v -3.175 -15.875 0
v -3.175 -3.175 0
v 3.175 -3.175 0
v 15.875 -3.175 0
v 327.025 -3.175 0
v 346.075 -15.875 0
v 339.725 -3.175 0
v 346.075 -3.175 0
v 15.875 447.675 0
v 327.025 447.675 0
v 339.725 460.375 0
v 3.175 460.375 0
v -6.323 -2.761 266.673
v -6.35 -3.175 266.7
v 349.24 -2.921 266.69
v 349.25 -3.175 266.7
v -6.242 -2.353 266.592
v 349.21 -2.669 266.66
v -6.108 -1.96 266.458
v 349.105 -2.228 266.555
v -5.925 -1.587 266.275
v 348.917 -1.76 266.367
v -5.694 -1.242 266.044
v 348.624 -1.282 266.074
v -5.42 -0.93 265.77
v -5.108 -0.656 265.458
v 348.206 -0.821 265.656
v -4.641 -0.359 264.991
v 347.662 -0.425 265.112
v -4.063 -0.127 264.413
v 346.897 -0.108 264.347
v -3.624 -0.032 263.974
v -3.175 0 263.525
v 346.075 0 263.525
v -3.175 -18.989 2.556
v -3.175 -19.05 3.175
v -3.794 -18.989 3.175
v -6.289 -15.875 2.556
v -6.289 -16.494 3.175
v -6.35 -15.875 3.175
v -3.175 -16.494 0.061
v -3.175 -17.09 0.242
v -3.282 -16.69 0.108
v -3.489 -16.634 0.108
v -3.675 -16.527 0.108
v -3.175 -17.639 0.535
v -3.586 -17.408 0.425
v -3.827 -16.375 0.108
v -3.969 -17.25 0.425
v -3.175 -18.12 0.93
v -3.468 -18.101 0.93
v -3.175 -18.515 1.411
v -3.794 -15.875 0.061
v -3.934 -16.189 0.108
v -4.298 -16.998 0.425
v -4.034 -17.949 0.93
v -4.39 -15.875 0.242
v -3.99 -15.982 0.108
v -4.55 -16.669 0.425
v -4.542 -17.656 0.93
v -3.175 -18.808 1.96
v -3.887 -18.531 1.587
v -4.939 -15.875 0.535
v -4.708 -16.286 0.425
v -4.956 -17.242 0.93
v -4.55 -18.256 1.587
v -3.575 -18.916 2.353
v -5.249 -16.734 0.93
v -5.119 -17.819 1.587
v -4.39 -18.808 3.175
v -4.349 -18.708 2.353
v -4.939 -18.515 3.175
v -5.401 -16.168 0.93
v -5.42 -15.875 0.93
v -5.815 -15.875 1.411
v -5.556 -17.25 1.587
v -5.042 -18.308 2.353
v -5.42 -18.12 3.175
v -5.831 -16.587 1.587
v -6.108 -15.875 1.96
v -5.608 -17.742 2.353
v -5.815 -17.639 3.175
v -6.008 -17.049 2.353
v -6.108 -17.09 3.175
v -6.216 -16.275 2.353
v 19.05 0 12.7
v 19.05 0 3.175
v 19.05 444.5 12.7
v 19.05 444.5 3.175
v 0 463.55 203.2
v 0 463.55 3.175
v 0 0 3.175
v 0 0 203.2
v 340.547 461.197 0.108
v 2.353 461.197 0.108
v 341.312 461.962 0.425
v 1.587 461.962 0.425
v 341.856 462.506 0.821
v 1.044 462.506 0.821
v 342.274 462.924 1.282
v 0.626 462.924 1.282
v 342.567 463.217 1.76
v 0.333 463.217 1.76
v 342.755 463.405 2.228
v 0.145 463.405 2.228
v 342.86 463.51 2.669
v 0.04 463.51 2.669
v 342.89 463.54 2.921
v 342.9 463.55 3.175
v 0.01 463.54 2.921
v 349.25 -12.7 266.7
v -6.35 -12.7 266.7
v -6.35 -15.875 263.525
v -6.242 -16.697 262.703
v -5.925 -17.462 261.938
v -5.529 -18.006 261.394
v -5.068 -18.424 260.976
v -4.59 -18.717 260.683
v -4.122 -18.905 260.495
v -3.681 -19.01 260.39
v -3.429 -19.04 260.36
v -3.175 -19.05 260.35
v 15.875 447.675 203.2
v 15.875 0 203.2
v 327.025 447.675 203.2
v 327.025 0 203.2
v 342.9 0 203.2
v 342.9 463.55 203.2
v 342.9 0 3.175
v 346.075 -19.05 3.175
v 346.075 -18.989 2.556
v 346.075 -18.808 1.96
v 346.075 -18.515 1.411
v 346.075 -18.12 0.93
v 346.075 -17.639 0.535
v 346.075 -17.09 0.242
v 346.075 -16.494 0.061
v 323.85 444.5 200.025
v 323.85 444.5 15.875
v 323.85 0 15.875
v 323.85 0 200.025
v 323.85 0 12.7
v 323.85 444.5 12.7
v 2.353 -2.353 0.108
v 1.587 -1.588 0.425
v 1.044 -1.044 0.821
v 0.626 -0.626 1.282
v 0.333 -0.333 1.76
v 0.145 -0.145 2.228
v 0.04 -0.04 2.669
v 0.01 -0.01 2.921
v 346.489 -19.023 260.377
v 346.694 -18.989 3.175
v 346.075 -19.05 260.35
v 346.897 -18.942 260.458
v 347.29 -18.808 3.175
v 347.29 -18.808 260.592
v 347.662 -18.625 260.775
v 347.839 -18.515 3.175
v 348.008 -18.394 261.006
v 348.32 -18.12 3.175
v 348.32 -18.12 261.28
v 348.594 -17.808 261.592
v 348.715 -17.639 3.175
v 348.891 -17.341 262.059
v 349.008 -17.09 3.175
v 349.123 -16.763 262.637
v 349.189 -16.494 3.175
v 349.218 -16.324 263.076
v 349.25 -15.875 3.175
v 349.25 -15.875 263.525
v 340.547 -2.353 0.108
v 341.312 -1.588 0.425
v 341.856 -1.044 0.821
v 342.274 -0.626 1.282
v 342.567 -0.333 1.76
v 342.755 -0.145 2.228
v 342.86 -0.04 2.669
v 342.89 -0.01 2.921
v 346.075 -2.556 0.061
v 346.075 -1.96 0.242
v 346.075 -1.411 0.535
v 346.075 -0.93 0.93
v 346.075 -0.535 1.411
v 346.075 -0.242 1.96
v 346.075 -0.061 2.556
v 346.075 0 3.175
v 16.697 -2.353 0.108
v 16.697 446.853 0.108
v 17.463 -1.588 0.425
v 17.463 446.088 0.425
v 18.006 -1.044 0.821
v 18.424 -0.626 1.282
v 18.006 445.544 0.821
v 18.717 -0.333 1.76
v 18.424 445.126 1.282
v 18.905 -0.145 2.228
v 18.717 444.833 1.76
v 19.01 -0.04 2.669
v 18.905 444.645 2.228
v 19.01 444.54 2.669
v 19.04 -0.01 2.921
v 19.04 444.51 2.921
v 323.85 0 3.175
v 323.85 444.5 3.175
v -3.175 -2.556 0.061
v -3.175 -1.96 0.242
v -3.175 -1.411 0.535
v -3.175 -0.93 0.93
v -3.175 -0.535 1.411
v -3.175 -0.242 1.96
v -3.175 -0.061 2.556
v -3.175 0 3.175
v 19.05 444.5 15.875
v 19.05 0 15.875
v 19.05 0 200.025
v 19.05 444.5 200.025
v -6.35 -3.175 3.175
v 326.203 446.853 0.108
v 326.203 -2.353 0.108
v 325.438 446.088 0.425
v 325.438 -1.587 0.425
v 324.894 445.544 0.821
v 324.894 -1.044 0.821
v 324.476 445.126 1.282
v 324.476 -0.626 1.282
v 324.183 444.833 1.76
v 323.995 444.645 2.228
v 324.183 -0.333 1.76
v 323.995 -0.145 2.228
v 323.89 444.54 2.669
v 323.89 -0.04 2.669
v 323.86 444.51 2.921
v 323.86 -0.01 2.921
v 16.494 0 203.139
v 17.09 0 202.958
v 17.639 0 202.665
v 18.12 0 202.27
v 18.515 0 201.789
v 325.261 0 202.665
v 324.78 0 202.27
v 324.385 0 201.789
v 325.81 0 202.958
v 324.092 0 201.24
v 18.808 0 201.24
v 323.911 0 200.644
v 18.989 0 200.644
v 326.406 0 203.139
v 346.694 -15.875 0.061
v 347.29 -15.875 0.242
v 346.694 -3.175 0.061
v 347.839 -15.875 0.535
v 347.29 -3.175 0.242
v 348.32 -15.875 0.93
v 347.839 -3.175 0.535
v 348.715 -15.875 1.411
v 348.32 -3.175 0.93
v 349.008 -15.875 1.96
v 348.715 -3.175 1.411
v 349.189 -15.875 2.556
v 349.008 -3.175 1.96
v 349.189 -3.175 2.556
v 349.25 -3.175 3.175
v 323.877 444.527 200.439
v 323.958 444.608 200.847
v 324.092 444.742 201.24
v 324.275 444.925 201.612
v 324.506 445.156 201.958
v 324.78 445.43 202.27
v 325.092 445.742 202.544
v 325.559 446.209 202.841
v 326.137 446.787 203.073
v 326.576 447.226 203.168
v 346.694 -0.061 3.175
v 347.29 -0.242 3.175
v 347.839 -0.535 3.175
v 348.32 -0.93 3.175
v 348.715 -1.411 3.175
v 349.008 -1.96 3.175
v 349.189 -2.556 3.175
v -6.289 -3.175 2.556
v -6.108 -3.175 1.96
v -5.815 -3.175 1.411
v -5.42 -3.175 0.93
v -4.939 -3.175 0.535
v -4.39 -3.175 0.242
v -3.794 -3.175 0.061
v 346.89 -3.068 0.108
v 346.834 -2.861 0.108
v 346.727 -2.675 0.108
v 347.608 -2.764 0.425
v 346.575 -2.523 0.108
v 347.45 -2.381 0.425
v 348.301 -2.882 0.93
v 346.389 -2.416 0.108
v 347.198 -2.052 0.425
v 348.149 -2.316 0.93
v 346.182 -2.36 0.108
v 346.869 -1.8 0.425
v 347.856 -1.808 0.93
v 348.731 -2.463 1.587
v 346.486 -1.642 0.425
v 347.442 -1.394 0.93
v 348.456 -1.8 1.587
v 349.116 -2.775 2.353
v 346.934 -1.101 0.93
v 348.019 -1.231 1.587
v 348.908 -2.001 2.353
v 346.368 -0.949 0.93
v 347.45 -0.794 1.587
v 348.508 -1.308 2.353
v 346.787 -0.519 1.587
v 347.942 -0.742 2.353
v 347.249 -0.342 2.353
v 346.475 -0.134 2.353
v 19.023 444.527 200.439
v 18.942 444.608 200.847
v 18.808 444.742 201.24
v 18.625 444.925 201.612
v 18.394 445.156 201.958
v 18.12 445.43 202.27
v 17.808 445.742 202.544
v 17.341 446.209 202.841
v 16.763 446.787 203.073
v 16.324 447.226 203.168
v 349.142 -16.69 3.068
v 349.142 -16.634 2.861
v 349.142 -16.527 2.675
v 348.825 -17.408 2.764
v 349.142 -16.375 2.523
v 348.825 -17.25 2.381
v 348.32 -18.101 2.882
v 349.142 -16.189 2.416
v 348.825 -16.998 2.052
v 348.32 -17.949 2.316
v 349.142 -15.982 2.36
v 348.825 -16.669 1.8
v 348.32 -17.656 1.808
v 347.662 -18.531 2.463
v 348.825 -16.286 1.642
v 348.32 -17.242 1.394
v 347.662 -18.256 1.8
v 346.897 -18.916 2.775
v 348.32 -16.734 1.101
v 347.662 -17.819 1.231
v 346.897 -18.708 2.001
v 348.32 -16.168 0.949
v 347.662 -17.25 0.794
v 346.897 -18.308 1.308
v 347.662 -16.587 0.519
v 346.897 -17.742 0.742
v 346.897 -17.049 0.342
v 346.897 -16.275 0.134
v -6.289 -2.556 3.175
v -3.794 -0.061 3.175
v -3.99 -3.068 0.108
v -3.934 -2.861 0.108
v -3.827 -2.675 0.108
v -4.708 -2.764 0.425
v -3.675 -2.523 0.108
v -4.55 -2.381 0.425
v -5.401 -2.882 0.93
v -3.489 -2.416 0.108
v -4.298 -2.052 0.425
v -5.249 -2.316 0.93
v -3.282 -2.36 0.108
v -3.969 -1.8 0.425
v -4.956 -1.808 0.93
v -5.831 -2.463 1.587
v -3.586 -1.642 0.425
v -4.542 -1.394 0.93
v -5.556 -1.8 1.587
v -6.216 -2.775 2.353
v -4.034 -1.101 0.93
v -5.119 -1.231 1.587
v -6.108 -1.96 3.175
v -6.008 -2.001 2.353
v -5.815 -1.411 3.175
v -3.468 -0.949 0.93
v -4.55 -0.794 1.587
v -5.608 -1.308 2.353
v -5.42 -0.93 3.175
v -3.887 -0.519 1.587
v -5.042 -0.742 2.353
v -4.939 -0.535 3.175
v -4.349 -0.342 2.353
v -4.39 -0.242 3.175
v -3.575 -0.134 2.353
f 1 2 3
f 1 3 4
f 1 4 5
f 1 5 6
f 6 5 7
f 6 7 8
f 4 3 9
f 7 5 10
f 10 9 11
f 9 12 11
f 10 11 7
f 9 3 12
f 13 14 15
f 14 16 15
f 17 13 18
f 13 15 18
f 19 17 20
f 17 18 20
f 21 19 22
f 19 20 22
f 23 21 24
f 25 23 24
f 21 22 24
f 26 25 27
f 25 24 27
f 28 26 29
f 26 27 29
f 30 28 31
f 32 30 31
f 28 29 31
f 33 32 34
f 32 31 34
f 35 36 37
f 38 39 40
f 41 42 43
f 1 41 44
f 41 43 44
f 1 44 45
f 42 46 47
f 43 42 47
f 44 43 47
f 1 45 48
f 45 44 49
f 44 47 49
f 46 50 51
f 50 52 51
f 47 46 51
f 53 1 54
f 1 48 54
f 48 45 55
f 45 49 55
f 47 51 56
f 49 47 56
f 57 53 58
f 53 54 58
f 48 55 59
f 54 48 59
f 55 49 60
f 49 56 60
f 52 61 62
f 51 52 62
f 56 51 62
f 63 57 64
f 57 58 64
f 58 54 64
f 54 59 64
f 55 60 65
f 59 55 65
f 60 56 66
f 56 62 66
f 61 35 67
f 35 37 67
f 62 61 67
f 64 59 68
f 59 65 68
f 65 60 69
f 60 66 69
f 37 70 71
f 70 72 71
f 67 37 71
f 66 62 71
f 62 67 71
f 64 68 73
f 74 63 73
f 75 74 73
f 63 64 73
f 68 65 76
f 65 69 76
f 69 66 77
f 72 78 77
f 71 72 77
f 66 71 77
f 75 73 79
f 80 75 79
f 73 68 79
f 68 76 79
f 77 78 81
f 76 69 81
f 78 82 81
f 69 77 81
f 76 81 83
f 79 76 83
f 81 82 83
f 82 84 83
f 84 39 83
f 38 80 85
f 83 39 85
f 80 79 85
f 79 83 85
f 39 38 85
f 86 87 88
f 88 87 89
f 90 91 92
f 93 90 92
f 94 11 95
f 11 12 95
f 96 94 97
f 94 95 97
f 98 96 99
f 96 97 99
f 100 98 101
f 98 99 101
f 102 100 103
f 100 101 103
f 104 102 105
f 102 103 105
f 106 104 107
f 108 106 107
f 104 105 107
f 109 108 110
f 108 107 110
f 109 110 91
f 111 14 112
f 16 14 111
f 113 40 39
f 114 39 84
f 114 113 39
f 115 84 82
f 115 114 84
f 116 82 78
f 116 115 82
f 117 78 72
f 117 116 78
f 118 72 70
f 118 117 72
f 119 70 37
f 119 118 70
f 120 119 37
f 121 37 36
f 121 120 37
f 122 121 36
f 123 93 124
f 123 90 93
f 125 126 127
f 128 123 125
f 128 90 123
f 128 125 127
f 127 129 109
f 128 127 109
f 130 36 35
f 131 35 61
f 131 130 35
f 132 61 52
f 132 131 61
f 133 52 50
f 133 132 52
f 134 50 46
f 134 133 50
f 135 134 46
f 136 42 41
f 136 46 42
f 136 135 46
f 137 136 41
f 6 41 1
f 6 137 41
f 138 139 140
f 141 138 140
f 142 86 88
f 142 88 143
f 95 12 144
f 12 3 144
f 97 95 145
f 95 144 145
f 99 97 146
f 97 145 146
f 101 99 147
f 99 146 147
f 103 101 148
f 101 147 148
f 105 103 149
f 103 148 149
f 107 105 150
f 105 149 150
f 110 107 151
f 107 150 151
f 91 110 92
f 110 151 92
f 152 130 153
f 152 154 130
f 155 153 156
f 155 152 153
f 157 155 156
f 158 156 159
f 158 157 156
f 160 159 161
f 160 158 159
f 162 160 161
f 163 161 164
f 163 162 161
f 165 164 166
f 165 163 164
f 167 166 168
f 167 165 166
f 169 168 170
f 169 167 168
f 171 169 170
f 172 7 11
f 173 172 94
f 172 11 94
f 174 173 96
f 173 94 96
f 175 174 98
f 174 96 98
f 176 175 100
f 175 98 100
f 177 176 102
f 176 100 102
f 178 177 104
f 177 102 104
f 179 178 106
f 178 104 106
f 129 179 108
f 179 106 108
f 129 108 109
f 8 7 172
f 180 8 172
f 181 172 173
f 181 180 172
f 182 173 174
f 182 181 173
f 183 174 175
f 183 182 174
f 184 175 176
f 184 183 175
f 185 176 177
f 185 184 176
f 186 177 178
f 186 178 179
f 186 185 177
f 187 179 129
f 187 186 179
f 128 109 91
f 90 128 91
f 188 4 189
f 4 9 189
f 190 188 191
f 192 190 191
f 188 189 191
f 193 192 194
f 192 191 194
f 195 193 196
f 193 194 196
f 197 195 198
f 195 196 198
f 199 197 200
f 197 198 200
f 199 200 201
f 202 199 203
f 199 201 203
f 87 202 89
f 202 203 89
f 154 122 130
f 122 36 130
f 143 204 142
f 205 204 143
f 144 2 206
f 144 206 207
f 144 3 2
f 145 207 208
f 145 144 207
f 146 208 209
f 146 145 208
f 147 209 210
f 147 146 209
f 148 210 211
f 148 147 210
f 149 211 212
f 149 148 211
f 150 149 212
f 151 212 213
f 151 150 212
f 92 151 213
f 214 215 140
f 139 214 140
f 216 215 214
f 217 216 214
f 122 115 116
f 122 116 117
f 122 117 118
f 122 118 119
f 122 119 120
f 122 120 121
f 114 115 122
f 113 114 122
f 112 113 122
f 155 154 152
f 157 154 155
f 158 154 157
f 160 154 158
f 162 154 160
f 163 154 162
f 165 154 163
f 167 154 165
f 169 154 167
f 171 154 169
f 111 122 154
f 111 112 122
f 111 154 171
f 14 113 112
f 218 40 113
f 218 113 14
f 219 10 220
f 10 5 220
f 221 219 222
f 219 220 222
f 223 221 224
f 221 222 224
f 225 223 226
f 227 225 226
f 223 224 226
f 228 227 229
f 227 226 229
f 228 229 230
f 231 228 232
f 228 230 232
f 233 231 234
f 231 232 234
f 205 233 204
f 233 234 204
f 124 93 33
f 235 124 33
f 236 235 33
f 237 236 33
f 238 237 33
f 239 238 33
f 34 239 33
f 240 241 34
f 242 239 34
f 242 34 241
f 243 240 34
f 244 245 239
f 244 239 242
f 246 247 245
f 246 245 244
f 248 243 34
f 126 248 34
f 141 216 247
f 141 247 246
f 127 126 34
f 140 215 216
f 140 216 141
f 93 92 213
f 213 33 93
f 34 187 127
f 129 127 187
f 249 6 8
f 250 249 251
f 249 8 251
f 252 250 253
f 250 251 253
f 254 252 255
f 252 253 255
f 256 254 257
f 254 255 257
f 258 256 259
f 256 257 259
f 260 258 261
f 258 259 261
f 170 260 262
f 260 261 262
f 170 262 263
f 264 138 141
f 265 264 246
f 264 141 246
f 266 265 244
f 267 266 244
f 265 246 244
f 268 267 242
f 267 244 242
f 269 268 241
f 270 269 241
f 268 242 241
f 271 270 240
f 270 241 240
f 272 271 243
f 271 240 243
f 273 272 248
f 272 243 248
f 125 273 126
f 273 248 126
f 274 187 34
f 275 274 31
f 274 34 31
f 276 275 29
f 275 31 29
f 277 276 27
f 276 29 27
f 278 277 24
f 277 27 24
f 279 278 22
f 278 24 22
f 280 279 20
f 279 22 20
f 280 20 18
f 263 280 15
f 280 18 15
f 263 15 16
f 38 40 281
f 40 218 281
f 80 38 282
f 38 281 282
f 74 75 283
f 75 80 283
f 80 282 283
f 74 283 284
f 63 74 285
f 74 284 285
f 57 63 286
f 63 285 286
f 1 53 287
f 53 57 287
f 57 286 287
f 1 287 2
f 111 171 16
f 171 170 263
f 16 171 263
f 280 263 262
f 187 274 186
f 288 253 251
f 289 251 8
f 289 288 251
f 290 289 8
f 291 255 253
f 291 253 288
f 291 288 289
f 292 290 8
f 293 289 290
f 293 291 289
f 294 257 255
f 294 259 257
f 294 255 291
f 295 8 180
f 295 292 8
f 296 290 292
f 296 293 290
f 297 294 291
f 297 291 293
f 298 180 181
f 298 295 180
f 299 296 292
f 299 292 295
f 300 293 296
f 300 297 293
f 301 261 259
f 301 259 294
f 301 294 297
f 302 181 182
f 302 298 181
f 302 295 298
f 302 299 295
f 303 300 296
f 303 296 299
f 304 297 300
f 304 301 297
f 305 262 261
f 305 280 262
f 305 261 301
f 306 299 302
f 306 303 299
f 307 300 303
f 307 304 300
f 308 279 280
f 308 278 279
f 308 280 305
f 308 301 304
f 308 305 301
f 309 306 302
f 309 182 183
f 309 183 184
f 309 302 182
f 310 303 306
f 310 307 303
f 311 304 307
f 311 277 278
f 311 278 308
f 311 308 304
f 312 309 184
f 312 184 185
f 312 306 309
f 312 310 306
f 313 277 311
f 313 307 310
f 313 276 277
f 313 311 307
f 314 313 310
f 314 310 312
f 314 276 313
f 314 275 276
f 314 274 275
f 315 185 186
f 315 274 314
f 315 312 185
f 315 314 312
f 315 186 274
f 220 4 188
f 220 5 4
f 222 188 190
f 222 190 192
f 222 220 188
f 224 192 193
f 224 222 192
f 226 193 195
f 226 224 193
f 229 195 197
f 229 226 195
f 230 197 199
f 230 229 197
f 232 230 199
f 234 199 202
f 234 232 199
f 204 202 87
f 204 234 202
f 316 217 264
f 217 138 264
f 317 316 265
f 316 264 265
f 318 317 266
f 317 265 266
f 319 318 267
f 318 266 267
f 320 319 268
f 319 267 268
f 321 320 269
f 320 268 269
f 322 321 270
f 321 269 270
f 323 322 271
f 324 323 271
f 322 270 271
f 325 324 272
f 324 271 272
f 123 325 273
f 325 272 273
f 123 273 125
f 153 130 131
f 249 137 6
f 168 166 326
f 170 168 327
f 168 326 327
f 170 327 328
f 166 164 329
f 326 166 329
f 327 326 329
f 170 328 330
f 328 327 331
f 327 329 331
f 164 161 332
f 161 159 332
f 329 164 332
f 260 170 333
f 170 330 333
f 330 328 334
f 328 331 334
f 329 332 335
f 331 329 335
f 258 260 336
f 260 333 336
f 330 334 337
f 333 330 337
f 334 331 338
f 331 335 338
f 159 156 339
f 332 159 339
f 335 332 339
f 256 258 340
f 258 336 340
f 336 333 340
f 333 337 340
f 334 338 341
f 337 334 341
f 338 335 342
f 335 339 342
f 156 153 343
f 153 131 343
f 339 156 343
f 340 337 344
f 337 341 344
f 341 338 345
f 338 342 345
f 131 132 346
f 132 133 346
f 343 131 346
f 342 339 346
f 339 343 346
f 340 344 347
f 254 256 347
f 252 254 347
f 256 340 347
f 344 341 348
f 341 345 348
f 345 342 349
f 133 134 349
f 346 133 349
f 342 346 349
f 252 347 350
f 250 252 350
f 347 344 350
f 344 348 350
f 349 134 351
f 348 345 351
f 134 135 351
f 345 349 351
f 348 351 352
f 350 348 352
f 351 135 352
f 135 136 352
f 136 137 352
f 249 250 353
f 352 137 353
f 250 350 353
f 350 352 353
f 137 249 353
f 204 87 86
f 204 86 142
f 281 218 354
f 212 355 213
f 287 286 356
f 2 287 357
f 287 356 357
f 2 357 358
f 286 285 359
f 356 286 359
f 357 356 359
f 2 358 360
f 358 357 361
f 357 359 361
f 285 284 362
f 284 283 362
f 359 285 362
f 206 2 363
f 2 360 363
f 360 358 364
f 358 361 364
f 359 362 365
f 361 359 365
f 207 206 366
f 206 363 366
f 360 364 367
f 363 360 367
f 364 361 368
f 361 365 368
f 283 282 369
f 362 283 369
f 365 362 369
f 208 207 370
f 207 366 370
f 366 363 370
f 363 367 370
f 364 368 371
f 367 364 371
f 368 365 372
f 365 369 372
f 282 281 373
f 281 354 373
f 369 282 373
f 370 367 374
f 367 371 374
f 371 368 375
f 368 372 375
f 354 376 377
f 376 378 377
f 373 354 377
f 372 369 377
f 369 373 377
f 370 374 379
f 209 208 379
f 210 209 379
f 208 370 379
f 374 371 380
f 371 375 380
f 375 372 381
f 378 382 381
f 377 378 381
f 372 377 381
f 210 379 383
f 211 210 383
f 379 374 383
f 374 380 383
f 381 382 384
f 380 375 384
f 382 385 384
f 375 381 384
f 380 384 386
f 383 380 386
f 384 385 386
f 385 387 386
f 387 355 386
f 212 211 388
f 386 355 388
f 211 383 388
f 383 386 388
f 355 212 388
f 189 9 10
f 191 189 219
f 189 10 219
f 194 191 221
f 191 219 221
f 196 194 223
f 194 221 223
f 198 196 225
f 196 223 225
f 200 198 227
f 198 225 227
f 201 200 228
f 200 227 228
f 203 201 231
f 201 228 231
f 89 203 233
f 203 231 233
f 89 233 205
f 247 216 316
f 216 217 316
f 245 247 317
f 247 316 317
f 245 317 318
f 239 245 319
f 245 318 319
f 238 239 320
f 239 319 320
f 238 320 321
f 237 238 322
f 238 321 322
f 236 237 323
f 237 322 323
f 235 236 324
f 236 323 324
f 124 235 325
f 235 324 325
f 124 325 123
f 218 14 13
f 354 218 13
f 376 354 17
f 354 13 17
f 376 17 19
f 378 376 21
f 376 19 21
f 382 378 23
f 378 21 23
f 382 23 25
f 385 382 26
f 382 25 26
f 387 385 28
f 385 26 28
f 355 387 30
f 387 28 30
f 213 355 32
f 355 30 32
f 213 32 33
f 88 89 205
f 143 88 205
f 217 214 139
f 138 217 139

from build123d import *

# Parameters (mm, degrees)
F1_DEPTH = 203.2
F2_W     = 355.6
F2_H     = 19.05
F3_DEPTH = 266.7
F4_SIZE  = 6.35
F5_R     = 3.175
F6_W     = 304.8
F6_H     = 444.5
F7_DEPTH = 15.875
F8_DEPTH = 12.7


with BuildPart() as f1:
    # F0 (on Top) → F1 (new body)
    with BuildSketch(Plane.XY):
        Polygon((0, 463.55), (0, 0), (19.05, 0), (19.05, 444.5), (323.85, 444.5), (323.85, 0), (342.9, 0), (342.9, 463.55), align=None)
    extrude(amount=F1_DEPTH)

    # F2 (on Top) → F3 (join)
    with BuildSketch(Plane.XY):
        with Locations((171.45, -9.525)):
            Rectangle(F2_W, F2_H)
    extrude(amount=F3_DEPTH)

    # F4
    f4_edges = [f1.edges().sort_by_distance(p)[0] for p in [
        (171.45, -19.05, 266.7),
    ]]
    chamfer(f4_edges, length=F4_SIZE)

    # F5
    f5_edges = [f1.edges().sort_by_distance(p)[0] for p in [
        (-6.35, -19.05, 130.175),
        (-6.35, 0, 133.35),
        (171.45, 0, 0),
        (171.45, -19.05, 0),
        (0, 231.775, 0),
        (19.05, 222.25, 0),
        (171.45, 463.55, 0),
        (171.45, 444.5, 0),
        (323.85, 222.25, 0),
        (342.9, 231.775, 0),
        (349.25, 0, 133.35),
        (349.25, -19.05, 130.175),
        (19.05, 222.25, 203.2),
        (171.45, 444.5, 203.2),
        (323.85, 222.25, 203.2),
        (-6.35, -9.525, 0),
        (349.25, -9.525, 0),
        (346.075, 0, 0),
        (-3.175, 0, 0),
        (171.45, 0, 266.7),
    ]]
    fillet(f5_edges, radius=F5_R)

    # F6 (on Top) → F7 (join)
    with BuildSketch(Plane.XY):
        with Locations((171.45, 222.25)):
            Rectangle(F6_W, F6_H)
    extrude(amount=F7_DEPTH)

    # F6 (on Top) → F8 (cut)
    with BuildSketch(Plane.XY):
        with Locations((171.45, 222.25)):
            Rectangle(F6_W, F6_H)
    extrude(amount=F8_DEPTH, mode=Mode.SUBTRACT)


solid = f1.part
